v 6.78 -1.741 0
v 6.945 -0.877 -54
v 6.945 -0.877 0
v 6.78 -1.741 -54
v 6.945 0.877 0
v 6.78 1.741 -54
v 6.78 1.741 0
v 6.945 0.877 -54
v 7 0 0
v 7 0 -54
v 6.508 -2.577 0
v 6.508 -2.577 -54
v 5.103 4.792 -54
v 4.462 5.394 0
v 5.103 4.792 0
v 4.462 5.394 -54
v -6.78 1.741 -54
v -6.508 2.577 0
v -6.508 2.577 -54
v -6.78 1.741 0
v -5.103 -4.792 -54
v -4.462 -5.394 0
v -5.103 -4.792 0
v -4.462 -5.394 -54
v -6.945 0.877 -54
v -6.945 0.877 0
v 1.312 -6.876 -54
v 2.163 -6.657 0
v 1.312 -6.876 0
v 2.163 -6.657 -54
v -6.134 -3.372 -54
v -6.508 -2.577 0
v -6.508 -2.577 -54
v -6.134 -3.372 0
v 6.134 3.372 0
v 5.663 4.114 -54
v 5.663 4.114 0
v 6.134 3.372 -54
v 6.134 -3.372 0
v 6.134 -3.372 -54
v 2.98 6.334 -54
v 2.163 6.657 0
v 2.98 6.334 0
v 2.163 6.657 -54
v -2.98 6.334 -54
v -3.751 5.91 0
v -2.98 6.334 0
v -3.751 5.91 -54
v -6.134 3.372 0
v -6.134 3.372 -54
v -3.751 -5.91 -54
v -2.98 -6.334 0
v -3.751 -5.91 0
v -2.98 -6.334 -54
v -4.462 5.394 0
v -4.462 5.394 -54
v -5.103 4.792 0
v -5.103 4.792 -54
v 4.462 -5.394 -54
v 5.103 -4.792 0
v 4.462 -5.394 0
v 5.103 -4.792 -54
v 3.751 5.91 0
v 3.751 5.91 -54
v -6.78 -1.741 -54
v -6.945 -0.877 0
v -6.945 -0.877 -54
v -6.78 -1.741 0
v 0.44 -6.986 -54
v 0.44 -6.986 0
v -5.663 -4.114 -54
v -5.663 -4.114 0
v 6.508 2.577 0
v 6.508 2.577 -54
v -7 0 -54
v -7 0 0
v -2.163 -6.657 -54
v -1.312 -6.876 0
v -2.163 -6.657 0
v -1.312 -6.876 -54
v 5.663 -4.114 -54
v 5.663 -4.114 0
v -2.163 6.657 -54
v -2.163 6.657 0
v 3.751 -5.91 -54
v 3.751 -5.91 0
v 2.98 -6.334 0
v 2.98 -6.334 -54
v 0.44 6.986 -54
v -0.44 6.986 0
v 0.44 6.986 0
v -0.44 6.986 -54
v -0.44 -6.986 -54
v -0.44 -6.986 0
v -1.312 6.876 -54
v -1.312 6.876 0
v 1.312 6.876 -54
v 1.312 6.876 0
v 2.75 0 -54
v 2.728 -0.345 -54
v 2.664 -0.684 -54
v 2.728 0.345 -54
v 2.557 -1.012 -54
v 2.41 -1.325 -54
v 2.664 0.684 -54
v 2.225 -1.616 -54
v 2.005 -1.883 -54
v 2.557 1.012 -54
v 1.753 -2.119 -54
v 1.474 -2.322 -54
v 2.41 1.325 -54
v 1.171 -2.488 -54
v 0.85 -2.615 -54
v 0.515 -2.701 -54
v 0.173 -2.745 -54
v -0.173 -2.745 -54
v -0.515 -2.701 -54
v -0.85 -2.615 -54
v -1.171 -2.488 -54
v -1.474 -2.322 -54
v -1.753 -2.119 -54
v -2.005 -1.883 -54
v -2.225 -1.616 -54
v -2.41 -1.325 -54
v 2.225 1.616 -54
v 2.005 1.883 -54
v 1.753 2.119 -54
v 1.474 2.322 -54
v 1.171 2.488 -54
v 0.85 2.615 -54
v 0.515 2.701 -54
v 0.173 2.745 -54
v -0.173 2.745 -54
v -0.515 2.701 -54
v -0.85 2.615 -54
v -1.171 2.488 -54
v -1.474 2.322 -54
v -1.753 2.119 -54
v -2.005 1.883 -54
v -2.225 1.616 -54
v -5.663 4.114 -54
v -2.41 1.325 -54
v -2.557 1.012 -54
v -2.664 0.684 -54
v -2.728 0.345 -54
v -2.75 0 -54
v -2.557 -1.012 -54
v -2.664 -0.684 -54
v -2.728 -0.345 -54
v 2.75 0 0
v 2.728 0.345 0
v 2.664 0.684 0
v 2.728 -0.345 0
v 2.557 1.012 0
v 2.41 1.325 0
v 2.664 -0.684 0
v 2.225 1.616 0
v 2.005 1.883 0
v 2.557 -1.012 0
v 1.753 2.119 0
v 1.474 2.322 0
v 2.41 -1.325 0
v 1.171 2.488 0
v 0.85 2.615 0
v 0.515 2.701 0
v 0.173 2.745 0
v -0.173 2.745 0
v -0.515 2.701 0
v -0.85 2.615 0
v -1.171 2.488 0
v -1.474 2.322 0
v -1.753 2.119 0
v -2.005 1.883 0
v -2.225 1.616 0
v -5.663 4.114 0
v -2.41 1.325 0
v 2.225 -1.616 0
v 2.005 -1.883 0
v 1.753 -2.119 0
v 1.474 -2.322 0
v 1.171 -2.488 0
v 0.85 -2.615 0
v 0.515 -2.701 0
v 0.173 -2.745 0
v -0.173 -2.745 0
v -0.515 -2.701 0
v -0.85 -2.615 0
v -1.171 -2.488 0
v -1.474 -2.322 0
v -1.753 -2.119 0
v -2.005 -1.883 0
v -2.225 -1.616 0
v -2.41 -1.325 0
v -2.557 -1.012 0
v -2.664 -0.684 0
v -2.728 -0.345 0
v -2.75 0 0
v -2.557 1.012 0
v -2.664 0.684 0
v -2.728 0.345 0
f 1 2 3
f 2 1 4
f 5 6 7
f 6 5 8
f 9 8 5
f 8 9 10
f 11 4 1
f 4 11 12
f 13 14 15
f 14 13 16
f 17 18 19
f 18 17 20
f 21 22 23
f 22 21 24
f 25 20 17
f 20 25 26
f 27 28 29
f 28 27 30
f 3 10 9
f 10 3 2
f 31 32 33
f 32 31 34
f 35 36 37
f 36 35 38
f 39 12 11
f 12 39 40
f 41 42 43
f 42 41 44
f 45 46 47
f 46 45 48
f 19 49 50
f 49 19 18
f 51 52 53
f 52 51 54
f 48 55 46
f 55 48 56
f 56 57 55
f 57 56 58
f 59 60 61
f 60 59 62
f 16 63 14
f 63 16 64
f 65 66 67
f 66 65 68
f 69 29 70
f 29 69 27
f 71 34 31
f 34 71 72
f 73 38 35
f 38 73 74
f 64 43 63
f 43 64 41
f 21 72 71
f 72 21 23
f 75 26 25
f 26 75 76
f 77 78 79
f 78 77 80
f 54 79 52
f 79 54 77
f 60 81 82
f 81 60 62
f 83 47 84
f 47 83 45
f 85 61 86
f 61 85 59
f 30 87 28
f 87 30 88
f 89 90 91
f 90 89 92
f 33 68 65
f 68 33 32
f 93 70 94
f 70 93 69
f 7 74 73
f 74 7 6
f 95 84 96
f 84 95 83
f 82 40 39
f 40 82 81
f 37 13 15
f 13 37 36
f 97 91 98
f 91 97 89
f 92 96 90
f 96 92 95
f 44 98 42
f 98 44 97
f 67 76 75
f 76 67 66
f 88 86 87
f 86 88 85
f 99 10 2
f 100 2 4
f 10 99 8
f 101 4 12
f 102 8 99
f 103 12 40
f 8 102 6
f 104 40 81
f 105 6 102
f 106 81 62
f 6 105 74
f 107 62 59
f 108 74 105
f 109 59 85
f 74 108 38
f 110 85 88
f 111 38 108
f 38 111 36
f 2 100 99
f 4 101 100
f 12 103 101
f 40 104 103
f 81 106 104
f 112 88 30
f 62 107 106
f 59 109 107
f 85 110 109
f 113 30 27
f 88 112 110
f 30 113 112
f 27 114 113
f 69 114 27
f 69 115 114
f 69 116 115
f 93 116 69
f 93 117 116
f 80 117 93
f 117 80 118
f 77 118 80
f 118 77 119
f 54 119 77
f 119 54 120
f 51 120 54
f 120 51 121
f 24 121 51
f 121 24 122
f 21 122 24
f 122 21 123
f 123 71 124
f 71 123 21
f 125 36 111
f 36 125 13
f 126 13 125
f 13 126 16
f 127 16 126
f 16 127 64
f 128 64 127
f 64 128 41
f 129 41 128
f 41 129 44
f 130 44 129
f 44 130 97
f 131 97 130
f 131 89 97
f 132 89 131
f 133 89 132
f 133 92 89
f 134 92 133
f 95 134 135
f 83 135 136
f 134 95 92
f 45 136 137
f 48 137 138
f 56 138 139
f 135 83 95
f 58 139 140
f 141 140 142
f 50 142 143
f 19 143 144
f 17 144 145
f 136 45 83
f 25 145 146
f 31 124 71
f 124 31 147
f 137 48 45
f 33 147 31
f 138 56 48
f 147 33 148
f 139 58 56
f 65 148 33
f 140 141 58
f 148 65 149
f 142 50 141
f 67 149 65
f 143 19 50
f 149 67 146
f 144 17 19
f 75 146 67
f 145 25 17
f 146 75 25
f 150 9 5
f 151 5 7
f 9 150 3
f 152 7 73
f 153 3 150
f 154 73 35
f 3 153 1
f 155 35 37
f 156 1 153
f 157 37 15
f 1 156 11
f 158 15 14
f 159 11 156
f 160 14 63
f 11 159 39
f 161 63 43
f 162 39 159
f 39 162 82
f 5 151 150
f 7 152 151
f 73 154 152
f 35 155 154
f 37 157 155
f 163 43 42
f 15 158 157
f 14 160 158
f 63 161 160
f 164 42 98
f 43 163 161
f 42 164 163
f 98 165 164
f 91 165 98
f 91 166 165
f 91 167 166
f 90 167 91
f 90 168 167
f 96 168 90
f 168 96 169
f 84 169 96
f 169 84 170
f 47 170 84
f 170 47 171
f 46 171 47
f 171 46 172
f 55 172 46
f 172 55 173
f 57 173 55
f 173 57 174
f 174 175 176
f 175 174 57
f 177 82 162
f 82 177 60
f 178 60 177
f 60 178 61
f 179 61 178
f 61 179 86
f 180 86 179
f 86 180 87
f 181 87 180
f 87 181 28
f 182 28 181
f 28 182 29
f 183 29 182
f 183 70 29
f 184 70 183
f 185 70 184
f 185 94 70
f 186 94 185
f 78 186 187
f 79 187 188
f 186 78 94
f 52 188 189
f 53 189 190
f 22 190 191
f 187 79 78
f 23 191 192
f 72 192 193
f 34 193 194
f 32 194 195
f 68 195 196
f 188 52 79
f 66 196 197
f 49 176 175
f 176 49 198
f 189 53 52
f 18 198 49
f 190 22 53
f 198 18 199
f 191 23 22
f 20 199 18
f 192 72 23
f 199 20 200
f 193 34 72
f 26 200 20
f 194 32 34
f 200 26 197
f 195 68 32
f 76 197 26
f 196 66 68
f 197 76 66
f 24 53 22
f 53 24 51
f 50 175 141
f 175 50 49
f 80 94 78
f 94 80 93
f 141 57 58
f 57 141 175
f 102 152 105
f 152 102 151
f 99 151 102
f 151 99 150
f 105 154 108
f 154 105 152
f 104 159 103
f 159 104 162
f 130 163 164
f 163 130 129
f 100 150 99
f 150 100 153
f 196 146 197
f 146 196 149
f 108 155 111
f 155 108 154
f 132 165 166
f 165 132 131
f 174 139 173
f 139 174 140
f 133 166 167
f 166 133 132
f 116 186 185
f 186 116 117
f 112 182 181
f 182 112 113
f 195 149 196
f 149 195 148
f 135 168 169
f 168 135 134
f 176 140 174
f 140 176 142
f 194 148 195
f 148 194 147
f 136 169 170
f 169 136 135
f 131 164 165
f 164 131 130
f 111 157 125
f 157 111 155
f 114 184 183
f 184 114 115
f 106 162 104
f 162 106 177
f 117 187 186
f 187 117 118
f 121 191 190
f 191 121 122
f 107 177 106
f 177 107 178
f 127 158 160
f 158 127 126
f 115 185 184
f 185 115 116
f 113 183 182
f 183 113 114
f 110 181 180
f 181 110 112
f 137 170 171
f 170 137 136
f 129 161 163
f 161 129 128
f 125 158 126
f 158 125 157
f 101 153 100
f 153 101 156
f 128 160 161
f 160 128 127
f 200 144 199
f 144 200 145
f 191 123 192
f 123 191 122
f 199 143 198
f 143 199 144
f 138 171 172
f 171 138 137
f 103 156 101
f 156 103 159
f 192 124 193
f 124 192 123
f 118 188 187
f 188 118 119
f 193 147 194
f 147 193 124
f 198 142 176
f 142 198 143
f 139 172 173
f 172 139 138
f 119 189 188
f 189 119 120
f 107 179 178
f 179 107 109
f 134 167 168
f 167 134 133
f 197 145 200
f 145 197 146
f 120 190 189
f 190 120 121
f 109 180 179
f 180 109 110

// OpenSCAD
$fn = 50;


difference() {
	union() {
		translate(v = [0, 0, -54.0000000000]) {
			cylinder(h = 54, r = 7.0000000000);
		}
	}
	union() {
		#translate(v = [0, 0, -54]) {
			cylinder(h = 54, r = 2.7500000000);
		}
	}
}
